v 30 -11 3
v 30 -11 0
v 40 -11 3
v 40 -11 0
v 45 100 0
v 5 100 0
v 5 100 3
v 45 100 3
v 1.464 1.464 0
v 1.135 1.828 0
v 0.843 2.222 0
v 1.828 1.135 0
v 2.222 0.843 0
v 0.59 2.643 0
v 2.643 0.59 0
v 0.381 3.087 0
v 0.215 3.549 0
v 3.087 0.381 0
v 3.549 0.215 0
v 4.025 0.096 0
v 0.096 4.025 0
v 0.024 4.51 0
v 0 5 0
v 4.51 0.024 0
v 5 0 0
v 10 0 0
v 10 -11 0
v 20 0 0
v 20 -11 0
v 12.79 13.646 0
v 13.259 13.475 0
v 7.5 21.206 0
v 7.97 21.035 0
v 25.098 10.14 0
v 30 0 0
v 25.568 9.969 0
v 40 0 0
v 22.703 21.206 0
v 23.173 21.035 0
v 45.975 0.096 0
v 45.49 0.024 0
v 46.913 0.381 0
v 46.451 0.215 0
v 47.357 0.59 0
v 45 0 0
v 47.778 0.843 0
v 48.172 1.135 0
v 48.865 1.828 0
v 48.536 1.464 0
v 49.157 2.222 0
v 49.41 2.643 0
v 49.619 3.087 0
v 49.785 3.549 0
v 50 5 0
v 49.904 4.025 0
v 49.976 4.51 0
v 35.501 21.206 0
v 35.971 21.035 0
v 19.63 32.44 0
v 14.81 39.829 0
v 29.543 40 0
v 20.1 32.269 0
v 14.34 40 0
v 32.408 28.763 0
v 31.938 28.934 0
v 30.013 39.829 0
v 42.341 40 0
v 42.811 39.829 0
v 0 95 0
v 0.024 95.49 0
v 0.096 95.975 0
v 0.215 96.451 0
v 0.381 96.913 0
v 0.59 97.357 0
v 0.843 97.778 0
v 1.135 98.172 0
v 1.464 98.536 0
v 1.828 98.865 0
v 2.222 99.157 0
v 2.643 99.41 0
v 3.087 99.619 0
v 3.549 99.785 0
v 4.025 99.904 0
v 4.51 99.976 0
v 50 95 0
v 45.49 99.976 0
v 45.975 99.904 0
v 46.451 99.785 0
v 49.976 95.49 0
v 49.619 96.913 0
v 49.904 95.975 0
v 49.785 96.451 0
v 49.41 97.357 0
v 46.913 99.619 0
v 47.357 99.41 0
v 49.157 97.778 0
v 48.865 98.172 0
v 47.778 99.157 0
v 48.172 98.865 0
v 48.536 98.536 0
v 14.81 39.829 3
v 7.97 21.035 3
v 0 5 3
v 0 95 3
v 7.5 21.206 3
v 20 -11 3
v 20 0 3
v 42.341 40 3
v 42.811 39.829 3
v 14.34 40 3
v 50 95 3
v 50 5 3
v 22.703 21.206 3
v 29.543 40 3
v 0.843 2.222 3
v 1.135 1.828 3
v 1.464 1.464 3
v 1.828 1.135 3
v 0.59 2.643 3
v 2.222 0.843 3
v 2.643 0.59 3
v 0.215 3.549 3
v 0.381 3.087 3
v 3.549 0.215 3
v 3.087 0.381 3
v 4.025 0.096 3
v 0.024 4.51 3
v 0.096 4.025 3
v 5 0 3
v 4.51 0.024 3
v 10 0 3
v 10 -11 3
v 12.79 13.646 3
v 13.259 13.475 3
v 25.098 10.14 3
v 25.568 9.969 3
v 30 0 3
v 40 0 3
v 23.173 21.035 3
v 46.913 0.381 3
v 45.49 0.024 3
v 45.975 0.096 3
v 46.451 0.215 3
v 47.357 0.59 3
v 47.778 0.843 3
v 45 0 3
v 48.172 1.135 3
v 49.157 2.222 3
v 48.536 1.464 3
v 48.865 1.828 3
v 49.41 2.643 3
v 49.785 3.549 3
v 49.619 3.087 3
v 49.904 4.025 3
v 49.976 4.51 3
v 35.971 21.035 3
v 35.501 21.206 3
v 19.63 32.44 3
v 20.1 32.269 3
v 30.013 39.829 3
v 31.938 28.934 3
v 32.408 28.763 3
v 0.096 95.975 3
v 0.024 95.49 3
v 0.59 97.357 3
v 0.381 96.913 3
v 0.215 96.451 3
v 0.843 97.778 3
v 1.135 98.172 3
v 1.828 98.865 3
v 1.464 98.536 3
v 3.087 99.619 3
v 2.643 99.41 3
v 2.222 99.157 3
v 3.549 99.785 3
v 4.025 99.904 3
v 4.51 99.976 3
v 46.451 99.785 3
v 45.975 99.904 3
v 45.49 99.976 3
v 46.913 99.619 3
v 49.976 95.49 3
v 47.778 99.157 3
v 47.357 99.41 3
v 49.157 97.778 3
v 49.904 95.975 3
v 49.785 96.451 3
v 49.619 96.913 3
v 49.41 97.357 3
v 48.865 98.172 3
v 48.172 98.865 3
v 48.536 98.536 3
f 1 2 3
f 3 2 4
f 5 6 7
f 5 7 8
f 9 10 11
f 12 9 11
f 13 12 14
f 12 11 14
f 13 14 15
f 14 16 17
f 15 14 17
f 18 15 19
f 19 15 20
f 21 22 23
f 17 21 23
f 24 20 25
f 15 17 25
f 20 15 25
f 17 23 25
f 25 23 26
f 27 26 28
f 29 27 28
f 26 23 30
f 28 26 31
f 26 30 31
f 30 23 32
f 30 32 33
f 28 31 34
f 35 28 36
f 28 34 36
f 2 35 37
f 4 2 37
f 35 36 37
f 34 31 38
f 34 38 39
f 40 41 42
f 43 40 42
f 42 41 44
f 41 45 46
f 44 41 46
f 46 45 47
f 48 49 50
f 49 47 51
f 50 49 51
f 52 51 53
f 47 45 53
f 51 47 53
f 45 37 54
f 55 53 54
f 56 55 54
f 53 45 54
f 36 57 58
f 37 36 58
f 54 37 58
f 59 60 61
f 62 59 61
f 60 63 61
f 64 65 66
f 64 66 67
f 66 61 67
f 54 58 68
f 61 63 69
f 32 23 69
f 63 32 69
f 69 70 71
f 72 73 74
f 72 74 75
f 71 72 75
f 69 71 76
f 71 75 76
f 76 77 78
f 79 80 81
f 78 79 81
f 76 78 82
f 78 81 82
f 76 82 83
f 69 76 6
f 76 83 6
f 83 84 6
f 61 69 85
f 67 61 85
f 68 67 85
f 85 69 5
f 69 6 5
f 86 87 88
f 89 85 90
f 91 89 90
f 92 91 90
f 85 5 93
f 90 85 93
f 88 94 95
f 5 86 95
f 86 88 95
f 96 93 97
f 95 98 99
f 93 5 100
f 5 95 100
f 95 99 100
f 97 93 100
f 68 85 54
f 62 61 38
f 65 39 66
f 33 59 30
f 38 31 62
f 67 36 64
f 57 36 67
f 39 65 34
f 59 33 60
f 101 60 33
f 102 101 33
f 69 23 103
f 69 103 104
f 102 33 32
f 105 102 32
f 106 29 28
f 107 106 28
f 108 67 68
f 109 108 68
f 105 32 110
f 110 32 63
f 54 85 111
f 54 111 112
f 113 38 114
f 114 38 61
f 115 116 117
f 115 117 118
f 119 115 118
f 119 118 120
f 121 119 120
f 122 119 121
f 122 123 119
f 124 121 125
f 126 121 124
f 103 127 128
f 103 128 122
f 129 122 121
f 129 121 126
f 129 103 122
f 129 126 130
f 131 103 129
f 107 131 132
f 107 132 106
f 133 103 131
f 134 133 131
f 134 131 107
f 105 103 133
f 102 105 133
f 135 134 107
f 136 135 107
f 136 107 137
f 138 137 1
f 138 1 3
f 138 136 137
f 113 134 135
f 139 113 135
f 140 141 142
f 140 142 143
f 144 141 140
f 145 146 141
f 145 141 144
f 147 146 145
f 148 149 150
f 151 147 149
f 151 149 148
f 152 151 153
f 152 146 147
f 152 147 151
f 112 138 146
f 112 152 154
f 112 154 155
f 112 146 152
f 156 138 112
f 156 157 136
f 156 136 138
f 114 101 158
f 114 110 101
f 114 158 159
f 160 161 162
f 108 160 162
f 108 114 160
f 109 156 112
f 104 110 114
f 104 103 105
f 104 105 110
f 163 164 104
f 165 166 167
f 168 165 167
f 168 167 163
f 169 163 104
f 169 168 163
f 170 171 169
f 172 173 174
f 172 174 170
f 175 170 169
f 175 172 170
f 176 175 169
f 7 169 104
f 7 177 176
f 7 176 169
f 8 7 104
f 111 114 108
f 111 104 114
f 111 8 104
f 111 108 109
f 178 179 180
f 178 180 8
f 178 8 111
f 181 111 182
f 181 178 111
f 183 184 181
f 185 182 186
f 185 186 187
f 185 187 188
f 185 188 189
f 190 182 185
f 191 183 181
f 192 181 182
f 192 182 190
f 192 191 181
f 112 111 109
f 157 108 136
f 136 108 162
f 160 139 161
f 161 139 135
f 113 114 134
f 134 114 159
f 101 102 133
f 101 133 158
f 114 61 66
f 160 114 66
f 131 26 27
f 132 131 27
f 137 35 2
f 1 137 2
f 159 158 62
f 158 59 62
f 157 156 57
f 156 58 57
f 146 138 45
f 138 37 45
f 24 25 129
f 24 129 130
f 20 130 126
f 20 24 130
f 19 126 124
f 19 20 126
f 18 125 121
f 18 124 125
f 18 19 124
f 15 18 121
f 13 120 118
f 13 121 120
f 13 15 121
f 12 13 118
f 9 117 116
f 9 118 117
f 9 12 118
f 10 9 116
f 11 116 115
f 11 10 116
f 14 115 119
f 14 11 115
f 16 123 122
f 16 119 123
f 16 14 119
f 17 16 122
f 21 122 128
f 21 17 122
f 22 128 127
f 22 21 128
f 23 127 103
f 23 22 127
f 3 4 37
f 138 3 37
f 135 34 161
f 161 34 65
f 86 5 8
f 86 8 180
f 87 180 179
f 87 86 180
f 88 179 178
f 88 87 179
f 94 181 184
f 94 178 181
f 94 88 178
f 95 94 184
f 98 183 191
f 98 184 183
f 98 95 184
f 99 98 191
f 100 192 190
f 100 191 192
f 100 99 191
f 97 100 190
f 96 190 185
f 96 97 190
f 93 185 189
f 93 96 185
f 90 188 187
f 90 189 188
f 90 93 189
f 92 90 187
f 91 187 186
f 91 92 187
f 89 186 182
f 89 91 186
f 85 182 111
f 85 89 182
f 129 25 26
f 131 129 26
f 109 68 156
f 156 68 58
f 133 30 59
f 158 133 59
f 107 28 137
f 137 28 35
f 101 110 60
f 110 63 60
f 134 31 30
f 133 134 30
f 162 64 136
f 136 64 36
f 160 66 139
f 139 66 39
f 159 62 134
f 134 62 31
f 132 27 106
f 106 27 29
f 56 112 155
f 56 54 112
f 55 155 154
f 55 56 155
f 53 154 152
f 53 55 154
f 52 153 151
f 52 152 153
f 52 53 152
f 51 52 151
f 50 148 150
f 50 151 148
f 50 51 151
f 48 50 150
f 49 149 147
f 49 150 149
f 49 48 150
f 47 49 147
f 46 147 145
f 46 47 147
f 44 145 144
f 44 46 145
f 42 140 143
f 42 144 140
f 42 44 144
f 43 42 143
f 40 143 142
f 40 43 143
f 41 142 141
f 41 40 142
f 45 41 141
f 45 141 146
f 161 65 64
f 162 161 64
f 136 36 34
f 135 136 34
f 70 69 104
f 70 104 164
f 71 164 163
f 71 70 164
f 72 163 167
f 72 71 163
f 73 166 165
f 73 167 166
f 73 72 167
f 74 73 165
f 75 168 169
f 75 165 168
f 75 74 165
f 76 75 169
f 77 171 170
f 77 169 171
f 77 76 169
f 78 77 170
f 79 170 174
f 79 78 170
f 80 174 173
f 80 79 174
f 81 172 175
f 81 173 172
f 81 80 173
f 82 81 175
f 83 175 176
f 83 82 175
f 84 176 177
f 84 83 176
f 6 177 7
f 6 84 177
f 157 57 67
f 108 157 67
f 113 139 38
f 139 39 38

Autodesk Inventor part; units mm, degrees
ref_plane "YZ Plane" through (0, 0, 0) normal (1, 0, 0) x (0, 1, 0)
ref_plane "XZ Plane" through (0, 0, 0) normal (0, 1, 0) x (-1, 0, 0)
ref_plane "XY Plane" through (0, 0, 0) normal (0, 0, 1) x (1, 0, 0)
sketch "Skizze1" plane through (0, 0, 0) normal (0, 0, 1) x (1, 0, 0)
  line L0 (0, 5) -> (0, 95)
  line L1 (5, 100) -> (45, 100)
  line L2 (50, 95) -> (50, 5)
  arc A0 (5, 100) -> (0, 95) centre (5, 95) ccw
  arc A1 (50, 95) -> (45, 100) centre (45, 95) ccw
  arc A2 (45, 0) -> (50, 5) centre (45, 5) ccw
  arc A3 (0, 5) -> (5, 0) centre (5, 5) ccw
  line L3 (10, 0) -> (10, -11)
  line L4 (10, -11) -> (20, -11)
  line L5 (20, -11) -> (20, 0)
  line L6 (30, 0) -> (30, -11)
  line L7 (30, -11) -> (40, -11)
  line L8 (40, -11) -> (40, 0)
  line L9 (5, 0) -> (10, 0)
  line L10 (20, 0) -> (30, 0)
  line L11 (40, 0) -> (45, 0)
  line L12 (14.3404, 40) -> (14.8102, 39.829)
  line L13 (14.8102, 39.829) -> (7.9698, 21.0351)
  line L14 (7.9698, 21.0351) -> (7.5, 21.2061)
  line L15 (7.5, 21.2061) -> (14.3404, 40)
  line L16 (19.6299, 32.4397) -> (20.0998, 32.2687)
  line L17 (20.0998, 32.2687) -> (13.2594, 13.4748)
  line L18 (13.2594, 13.4748) -> (12.7895, 13.6459)
  line L19 (12.7895, 13.6459) -> (19.6299, 32.4397)
  line L20 (29.5432, 40) -> (30.013, 39.829)
  line L21 (30.013, 39.829) -> (23.1726, 21.0351)
  line L22 (22.7028, 21.2061) -> (29.5432, 40)
  line L23 (23.1726, 21.0351) -> (22.7028, 21.2061)
  line L24 (42.3412, 40) -> (42.8111, 39.829)
  line L25 (35.5008, 21.2061) -> (42.3412, 40)
  line L26 (42.8111, 39.829) -> (35.9707, 21.0351)
  line L27 (35.9707, 21.0351) -> (35.5008, 21.2061)
  line L28 (31.9383, 28.9336) -> (32.4081, 28.7626)
  line L29 (25.0979, 10.1397) -> (31.9383, 28.9336)
  line L30 (32.4081, 28.7626) -> (25.5677, 9.9687)
  line L31 (25.5677, 9.9687) -> (25.0979, 10.1397)
  point P0 (0, 0)
  dimension "d1" = 50
  dimension "d3" = 5
  dimension "d4" = 11
  dimension "d5" = 10
  dimension "d6" = 100
  dimension "d9" = 0.5
  dimension "d10" = 20
  dimension "d11" = 20
  dimension "d12" = 7.5
  dimension "d14" = 40
extrude "Extrusion1" add sketch "Skizze1" along normal blind 3
properties part number "Scheibe" material "Glas"
